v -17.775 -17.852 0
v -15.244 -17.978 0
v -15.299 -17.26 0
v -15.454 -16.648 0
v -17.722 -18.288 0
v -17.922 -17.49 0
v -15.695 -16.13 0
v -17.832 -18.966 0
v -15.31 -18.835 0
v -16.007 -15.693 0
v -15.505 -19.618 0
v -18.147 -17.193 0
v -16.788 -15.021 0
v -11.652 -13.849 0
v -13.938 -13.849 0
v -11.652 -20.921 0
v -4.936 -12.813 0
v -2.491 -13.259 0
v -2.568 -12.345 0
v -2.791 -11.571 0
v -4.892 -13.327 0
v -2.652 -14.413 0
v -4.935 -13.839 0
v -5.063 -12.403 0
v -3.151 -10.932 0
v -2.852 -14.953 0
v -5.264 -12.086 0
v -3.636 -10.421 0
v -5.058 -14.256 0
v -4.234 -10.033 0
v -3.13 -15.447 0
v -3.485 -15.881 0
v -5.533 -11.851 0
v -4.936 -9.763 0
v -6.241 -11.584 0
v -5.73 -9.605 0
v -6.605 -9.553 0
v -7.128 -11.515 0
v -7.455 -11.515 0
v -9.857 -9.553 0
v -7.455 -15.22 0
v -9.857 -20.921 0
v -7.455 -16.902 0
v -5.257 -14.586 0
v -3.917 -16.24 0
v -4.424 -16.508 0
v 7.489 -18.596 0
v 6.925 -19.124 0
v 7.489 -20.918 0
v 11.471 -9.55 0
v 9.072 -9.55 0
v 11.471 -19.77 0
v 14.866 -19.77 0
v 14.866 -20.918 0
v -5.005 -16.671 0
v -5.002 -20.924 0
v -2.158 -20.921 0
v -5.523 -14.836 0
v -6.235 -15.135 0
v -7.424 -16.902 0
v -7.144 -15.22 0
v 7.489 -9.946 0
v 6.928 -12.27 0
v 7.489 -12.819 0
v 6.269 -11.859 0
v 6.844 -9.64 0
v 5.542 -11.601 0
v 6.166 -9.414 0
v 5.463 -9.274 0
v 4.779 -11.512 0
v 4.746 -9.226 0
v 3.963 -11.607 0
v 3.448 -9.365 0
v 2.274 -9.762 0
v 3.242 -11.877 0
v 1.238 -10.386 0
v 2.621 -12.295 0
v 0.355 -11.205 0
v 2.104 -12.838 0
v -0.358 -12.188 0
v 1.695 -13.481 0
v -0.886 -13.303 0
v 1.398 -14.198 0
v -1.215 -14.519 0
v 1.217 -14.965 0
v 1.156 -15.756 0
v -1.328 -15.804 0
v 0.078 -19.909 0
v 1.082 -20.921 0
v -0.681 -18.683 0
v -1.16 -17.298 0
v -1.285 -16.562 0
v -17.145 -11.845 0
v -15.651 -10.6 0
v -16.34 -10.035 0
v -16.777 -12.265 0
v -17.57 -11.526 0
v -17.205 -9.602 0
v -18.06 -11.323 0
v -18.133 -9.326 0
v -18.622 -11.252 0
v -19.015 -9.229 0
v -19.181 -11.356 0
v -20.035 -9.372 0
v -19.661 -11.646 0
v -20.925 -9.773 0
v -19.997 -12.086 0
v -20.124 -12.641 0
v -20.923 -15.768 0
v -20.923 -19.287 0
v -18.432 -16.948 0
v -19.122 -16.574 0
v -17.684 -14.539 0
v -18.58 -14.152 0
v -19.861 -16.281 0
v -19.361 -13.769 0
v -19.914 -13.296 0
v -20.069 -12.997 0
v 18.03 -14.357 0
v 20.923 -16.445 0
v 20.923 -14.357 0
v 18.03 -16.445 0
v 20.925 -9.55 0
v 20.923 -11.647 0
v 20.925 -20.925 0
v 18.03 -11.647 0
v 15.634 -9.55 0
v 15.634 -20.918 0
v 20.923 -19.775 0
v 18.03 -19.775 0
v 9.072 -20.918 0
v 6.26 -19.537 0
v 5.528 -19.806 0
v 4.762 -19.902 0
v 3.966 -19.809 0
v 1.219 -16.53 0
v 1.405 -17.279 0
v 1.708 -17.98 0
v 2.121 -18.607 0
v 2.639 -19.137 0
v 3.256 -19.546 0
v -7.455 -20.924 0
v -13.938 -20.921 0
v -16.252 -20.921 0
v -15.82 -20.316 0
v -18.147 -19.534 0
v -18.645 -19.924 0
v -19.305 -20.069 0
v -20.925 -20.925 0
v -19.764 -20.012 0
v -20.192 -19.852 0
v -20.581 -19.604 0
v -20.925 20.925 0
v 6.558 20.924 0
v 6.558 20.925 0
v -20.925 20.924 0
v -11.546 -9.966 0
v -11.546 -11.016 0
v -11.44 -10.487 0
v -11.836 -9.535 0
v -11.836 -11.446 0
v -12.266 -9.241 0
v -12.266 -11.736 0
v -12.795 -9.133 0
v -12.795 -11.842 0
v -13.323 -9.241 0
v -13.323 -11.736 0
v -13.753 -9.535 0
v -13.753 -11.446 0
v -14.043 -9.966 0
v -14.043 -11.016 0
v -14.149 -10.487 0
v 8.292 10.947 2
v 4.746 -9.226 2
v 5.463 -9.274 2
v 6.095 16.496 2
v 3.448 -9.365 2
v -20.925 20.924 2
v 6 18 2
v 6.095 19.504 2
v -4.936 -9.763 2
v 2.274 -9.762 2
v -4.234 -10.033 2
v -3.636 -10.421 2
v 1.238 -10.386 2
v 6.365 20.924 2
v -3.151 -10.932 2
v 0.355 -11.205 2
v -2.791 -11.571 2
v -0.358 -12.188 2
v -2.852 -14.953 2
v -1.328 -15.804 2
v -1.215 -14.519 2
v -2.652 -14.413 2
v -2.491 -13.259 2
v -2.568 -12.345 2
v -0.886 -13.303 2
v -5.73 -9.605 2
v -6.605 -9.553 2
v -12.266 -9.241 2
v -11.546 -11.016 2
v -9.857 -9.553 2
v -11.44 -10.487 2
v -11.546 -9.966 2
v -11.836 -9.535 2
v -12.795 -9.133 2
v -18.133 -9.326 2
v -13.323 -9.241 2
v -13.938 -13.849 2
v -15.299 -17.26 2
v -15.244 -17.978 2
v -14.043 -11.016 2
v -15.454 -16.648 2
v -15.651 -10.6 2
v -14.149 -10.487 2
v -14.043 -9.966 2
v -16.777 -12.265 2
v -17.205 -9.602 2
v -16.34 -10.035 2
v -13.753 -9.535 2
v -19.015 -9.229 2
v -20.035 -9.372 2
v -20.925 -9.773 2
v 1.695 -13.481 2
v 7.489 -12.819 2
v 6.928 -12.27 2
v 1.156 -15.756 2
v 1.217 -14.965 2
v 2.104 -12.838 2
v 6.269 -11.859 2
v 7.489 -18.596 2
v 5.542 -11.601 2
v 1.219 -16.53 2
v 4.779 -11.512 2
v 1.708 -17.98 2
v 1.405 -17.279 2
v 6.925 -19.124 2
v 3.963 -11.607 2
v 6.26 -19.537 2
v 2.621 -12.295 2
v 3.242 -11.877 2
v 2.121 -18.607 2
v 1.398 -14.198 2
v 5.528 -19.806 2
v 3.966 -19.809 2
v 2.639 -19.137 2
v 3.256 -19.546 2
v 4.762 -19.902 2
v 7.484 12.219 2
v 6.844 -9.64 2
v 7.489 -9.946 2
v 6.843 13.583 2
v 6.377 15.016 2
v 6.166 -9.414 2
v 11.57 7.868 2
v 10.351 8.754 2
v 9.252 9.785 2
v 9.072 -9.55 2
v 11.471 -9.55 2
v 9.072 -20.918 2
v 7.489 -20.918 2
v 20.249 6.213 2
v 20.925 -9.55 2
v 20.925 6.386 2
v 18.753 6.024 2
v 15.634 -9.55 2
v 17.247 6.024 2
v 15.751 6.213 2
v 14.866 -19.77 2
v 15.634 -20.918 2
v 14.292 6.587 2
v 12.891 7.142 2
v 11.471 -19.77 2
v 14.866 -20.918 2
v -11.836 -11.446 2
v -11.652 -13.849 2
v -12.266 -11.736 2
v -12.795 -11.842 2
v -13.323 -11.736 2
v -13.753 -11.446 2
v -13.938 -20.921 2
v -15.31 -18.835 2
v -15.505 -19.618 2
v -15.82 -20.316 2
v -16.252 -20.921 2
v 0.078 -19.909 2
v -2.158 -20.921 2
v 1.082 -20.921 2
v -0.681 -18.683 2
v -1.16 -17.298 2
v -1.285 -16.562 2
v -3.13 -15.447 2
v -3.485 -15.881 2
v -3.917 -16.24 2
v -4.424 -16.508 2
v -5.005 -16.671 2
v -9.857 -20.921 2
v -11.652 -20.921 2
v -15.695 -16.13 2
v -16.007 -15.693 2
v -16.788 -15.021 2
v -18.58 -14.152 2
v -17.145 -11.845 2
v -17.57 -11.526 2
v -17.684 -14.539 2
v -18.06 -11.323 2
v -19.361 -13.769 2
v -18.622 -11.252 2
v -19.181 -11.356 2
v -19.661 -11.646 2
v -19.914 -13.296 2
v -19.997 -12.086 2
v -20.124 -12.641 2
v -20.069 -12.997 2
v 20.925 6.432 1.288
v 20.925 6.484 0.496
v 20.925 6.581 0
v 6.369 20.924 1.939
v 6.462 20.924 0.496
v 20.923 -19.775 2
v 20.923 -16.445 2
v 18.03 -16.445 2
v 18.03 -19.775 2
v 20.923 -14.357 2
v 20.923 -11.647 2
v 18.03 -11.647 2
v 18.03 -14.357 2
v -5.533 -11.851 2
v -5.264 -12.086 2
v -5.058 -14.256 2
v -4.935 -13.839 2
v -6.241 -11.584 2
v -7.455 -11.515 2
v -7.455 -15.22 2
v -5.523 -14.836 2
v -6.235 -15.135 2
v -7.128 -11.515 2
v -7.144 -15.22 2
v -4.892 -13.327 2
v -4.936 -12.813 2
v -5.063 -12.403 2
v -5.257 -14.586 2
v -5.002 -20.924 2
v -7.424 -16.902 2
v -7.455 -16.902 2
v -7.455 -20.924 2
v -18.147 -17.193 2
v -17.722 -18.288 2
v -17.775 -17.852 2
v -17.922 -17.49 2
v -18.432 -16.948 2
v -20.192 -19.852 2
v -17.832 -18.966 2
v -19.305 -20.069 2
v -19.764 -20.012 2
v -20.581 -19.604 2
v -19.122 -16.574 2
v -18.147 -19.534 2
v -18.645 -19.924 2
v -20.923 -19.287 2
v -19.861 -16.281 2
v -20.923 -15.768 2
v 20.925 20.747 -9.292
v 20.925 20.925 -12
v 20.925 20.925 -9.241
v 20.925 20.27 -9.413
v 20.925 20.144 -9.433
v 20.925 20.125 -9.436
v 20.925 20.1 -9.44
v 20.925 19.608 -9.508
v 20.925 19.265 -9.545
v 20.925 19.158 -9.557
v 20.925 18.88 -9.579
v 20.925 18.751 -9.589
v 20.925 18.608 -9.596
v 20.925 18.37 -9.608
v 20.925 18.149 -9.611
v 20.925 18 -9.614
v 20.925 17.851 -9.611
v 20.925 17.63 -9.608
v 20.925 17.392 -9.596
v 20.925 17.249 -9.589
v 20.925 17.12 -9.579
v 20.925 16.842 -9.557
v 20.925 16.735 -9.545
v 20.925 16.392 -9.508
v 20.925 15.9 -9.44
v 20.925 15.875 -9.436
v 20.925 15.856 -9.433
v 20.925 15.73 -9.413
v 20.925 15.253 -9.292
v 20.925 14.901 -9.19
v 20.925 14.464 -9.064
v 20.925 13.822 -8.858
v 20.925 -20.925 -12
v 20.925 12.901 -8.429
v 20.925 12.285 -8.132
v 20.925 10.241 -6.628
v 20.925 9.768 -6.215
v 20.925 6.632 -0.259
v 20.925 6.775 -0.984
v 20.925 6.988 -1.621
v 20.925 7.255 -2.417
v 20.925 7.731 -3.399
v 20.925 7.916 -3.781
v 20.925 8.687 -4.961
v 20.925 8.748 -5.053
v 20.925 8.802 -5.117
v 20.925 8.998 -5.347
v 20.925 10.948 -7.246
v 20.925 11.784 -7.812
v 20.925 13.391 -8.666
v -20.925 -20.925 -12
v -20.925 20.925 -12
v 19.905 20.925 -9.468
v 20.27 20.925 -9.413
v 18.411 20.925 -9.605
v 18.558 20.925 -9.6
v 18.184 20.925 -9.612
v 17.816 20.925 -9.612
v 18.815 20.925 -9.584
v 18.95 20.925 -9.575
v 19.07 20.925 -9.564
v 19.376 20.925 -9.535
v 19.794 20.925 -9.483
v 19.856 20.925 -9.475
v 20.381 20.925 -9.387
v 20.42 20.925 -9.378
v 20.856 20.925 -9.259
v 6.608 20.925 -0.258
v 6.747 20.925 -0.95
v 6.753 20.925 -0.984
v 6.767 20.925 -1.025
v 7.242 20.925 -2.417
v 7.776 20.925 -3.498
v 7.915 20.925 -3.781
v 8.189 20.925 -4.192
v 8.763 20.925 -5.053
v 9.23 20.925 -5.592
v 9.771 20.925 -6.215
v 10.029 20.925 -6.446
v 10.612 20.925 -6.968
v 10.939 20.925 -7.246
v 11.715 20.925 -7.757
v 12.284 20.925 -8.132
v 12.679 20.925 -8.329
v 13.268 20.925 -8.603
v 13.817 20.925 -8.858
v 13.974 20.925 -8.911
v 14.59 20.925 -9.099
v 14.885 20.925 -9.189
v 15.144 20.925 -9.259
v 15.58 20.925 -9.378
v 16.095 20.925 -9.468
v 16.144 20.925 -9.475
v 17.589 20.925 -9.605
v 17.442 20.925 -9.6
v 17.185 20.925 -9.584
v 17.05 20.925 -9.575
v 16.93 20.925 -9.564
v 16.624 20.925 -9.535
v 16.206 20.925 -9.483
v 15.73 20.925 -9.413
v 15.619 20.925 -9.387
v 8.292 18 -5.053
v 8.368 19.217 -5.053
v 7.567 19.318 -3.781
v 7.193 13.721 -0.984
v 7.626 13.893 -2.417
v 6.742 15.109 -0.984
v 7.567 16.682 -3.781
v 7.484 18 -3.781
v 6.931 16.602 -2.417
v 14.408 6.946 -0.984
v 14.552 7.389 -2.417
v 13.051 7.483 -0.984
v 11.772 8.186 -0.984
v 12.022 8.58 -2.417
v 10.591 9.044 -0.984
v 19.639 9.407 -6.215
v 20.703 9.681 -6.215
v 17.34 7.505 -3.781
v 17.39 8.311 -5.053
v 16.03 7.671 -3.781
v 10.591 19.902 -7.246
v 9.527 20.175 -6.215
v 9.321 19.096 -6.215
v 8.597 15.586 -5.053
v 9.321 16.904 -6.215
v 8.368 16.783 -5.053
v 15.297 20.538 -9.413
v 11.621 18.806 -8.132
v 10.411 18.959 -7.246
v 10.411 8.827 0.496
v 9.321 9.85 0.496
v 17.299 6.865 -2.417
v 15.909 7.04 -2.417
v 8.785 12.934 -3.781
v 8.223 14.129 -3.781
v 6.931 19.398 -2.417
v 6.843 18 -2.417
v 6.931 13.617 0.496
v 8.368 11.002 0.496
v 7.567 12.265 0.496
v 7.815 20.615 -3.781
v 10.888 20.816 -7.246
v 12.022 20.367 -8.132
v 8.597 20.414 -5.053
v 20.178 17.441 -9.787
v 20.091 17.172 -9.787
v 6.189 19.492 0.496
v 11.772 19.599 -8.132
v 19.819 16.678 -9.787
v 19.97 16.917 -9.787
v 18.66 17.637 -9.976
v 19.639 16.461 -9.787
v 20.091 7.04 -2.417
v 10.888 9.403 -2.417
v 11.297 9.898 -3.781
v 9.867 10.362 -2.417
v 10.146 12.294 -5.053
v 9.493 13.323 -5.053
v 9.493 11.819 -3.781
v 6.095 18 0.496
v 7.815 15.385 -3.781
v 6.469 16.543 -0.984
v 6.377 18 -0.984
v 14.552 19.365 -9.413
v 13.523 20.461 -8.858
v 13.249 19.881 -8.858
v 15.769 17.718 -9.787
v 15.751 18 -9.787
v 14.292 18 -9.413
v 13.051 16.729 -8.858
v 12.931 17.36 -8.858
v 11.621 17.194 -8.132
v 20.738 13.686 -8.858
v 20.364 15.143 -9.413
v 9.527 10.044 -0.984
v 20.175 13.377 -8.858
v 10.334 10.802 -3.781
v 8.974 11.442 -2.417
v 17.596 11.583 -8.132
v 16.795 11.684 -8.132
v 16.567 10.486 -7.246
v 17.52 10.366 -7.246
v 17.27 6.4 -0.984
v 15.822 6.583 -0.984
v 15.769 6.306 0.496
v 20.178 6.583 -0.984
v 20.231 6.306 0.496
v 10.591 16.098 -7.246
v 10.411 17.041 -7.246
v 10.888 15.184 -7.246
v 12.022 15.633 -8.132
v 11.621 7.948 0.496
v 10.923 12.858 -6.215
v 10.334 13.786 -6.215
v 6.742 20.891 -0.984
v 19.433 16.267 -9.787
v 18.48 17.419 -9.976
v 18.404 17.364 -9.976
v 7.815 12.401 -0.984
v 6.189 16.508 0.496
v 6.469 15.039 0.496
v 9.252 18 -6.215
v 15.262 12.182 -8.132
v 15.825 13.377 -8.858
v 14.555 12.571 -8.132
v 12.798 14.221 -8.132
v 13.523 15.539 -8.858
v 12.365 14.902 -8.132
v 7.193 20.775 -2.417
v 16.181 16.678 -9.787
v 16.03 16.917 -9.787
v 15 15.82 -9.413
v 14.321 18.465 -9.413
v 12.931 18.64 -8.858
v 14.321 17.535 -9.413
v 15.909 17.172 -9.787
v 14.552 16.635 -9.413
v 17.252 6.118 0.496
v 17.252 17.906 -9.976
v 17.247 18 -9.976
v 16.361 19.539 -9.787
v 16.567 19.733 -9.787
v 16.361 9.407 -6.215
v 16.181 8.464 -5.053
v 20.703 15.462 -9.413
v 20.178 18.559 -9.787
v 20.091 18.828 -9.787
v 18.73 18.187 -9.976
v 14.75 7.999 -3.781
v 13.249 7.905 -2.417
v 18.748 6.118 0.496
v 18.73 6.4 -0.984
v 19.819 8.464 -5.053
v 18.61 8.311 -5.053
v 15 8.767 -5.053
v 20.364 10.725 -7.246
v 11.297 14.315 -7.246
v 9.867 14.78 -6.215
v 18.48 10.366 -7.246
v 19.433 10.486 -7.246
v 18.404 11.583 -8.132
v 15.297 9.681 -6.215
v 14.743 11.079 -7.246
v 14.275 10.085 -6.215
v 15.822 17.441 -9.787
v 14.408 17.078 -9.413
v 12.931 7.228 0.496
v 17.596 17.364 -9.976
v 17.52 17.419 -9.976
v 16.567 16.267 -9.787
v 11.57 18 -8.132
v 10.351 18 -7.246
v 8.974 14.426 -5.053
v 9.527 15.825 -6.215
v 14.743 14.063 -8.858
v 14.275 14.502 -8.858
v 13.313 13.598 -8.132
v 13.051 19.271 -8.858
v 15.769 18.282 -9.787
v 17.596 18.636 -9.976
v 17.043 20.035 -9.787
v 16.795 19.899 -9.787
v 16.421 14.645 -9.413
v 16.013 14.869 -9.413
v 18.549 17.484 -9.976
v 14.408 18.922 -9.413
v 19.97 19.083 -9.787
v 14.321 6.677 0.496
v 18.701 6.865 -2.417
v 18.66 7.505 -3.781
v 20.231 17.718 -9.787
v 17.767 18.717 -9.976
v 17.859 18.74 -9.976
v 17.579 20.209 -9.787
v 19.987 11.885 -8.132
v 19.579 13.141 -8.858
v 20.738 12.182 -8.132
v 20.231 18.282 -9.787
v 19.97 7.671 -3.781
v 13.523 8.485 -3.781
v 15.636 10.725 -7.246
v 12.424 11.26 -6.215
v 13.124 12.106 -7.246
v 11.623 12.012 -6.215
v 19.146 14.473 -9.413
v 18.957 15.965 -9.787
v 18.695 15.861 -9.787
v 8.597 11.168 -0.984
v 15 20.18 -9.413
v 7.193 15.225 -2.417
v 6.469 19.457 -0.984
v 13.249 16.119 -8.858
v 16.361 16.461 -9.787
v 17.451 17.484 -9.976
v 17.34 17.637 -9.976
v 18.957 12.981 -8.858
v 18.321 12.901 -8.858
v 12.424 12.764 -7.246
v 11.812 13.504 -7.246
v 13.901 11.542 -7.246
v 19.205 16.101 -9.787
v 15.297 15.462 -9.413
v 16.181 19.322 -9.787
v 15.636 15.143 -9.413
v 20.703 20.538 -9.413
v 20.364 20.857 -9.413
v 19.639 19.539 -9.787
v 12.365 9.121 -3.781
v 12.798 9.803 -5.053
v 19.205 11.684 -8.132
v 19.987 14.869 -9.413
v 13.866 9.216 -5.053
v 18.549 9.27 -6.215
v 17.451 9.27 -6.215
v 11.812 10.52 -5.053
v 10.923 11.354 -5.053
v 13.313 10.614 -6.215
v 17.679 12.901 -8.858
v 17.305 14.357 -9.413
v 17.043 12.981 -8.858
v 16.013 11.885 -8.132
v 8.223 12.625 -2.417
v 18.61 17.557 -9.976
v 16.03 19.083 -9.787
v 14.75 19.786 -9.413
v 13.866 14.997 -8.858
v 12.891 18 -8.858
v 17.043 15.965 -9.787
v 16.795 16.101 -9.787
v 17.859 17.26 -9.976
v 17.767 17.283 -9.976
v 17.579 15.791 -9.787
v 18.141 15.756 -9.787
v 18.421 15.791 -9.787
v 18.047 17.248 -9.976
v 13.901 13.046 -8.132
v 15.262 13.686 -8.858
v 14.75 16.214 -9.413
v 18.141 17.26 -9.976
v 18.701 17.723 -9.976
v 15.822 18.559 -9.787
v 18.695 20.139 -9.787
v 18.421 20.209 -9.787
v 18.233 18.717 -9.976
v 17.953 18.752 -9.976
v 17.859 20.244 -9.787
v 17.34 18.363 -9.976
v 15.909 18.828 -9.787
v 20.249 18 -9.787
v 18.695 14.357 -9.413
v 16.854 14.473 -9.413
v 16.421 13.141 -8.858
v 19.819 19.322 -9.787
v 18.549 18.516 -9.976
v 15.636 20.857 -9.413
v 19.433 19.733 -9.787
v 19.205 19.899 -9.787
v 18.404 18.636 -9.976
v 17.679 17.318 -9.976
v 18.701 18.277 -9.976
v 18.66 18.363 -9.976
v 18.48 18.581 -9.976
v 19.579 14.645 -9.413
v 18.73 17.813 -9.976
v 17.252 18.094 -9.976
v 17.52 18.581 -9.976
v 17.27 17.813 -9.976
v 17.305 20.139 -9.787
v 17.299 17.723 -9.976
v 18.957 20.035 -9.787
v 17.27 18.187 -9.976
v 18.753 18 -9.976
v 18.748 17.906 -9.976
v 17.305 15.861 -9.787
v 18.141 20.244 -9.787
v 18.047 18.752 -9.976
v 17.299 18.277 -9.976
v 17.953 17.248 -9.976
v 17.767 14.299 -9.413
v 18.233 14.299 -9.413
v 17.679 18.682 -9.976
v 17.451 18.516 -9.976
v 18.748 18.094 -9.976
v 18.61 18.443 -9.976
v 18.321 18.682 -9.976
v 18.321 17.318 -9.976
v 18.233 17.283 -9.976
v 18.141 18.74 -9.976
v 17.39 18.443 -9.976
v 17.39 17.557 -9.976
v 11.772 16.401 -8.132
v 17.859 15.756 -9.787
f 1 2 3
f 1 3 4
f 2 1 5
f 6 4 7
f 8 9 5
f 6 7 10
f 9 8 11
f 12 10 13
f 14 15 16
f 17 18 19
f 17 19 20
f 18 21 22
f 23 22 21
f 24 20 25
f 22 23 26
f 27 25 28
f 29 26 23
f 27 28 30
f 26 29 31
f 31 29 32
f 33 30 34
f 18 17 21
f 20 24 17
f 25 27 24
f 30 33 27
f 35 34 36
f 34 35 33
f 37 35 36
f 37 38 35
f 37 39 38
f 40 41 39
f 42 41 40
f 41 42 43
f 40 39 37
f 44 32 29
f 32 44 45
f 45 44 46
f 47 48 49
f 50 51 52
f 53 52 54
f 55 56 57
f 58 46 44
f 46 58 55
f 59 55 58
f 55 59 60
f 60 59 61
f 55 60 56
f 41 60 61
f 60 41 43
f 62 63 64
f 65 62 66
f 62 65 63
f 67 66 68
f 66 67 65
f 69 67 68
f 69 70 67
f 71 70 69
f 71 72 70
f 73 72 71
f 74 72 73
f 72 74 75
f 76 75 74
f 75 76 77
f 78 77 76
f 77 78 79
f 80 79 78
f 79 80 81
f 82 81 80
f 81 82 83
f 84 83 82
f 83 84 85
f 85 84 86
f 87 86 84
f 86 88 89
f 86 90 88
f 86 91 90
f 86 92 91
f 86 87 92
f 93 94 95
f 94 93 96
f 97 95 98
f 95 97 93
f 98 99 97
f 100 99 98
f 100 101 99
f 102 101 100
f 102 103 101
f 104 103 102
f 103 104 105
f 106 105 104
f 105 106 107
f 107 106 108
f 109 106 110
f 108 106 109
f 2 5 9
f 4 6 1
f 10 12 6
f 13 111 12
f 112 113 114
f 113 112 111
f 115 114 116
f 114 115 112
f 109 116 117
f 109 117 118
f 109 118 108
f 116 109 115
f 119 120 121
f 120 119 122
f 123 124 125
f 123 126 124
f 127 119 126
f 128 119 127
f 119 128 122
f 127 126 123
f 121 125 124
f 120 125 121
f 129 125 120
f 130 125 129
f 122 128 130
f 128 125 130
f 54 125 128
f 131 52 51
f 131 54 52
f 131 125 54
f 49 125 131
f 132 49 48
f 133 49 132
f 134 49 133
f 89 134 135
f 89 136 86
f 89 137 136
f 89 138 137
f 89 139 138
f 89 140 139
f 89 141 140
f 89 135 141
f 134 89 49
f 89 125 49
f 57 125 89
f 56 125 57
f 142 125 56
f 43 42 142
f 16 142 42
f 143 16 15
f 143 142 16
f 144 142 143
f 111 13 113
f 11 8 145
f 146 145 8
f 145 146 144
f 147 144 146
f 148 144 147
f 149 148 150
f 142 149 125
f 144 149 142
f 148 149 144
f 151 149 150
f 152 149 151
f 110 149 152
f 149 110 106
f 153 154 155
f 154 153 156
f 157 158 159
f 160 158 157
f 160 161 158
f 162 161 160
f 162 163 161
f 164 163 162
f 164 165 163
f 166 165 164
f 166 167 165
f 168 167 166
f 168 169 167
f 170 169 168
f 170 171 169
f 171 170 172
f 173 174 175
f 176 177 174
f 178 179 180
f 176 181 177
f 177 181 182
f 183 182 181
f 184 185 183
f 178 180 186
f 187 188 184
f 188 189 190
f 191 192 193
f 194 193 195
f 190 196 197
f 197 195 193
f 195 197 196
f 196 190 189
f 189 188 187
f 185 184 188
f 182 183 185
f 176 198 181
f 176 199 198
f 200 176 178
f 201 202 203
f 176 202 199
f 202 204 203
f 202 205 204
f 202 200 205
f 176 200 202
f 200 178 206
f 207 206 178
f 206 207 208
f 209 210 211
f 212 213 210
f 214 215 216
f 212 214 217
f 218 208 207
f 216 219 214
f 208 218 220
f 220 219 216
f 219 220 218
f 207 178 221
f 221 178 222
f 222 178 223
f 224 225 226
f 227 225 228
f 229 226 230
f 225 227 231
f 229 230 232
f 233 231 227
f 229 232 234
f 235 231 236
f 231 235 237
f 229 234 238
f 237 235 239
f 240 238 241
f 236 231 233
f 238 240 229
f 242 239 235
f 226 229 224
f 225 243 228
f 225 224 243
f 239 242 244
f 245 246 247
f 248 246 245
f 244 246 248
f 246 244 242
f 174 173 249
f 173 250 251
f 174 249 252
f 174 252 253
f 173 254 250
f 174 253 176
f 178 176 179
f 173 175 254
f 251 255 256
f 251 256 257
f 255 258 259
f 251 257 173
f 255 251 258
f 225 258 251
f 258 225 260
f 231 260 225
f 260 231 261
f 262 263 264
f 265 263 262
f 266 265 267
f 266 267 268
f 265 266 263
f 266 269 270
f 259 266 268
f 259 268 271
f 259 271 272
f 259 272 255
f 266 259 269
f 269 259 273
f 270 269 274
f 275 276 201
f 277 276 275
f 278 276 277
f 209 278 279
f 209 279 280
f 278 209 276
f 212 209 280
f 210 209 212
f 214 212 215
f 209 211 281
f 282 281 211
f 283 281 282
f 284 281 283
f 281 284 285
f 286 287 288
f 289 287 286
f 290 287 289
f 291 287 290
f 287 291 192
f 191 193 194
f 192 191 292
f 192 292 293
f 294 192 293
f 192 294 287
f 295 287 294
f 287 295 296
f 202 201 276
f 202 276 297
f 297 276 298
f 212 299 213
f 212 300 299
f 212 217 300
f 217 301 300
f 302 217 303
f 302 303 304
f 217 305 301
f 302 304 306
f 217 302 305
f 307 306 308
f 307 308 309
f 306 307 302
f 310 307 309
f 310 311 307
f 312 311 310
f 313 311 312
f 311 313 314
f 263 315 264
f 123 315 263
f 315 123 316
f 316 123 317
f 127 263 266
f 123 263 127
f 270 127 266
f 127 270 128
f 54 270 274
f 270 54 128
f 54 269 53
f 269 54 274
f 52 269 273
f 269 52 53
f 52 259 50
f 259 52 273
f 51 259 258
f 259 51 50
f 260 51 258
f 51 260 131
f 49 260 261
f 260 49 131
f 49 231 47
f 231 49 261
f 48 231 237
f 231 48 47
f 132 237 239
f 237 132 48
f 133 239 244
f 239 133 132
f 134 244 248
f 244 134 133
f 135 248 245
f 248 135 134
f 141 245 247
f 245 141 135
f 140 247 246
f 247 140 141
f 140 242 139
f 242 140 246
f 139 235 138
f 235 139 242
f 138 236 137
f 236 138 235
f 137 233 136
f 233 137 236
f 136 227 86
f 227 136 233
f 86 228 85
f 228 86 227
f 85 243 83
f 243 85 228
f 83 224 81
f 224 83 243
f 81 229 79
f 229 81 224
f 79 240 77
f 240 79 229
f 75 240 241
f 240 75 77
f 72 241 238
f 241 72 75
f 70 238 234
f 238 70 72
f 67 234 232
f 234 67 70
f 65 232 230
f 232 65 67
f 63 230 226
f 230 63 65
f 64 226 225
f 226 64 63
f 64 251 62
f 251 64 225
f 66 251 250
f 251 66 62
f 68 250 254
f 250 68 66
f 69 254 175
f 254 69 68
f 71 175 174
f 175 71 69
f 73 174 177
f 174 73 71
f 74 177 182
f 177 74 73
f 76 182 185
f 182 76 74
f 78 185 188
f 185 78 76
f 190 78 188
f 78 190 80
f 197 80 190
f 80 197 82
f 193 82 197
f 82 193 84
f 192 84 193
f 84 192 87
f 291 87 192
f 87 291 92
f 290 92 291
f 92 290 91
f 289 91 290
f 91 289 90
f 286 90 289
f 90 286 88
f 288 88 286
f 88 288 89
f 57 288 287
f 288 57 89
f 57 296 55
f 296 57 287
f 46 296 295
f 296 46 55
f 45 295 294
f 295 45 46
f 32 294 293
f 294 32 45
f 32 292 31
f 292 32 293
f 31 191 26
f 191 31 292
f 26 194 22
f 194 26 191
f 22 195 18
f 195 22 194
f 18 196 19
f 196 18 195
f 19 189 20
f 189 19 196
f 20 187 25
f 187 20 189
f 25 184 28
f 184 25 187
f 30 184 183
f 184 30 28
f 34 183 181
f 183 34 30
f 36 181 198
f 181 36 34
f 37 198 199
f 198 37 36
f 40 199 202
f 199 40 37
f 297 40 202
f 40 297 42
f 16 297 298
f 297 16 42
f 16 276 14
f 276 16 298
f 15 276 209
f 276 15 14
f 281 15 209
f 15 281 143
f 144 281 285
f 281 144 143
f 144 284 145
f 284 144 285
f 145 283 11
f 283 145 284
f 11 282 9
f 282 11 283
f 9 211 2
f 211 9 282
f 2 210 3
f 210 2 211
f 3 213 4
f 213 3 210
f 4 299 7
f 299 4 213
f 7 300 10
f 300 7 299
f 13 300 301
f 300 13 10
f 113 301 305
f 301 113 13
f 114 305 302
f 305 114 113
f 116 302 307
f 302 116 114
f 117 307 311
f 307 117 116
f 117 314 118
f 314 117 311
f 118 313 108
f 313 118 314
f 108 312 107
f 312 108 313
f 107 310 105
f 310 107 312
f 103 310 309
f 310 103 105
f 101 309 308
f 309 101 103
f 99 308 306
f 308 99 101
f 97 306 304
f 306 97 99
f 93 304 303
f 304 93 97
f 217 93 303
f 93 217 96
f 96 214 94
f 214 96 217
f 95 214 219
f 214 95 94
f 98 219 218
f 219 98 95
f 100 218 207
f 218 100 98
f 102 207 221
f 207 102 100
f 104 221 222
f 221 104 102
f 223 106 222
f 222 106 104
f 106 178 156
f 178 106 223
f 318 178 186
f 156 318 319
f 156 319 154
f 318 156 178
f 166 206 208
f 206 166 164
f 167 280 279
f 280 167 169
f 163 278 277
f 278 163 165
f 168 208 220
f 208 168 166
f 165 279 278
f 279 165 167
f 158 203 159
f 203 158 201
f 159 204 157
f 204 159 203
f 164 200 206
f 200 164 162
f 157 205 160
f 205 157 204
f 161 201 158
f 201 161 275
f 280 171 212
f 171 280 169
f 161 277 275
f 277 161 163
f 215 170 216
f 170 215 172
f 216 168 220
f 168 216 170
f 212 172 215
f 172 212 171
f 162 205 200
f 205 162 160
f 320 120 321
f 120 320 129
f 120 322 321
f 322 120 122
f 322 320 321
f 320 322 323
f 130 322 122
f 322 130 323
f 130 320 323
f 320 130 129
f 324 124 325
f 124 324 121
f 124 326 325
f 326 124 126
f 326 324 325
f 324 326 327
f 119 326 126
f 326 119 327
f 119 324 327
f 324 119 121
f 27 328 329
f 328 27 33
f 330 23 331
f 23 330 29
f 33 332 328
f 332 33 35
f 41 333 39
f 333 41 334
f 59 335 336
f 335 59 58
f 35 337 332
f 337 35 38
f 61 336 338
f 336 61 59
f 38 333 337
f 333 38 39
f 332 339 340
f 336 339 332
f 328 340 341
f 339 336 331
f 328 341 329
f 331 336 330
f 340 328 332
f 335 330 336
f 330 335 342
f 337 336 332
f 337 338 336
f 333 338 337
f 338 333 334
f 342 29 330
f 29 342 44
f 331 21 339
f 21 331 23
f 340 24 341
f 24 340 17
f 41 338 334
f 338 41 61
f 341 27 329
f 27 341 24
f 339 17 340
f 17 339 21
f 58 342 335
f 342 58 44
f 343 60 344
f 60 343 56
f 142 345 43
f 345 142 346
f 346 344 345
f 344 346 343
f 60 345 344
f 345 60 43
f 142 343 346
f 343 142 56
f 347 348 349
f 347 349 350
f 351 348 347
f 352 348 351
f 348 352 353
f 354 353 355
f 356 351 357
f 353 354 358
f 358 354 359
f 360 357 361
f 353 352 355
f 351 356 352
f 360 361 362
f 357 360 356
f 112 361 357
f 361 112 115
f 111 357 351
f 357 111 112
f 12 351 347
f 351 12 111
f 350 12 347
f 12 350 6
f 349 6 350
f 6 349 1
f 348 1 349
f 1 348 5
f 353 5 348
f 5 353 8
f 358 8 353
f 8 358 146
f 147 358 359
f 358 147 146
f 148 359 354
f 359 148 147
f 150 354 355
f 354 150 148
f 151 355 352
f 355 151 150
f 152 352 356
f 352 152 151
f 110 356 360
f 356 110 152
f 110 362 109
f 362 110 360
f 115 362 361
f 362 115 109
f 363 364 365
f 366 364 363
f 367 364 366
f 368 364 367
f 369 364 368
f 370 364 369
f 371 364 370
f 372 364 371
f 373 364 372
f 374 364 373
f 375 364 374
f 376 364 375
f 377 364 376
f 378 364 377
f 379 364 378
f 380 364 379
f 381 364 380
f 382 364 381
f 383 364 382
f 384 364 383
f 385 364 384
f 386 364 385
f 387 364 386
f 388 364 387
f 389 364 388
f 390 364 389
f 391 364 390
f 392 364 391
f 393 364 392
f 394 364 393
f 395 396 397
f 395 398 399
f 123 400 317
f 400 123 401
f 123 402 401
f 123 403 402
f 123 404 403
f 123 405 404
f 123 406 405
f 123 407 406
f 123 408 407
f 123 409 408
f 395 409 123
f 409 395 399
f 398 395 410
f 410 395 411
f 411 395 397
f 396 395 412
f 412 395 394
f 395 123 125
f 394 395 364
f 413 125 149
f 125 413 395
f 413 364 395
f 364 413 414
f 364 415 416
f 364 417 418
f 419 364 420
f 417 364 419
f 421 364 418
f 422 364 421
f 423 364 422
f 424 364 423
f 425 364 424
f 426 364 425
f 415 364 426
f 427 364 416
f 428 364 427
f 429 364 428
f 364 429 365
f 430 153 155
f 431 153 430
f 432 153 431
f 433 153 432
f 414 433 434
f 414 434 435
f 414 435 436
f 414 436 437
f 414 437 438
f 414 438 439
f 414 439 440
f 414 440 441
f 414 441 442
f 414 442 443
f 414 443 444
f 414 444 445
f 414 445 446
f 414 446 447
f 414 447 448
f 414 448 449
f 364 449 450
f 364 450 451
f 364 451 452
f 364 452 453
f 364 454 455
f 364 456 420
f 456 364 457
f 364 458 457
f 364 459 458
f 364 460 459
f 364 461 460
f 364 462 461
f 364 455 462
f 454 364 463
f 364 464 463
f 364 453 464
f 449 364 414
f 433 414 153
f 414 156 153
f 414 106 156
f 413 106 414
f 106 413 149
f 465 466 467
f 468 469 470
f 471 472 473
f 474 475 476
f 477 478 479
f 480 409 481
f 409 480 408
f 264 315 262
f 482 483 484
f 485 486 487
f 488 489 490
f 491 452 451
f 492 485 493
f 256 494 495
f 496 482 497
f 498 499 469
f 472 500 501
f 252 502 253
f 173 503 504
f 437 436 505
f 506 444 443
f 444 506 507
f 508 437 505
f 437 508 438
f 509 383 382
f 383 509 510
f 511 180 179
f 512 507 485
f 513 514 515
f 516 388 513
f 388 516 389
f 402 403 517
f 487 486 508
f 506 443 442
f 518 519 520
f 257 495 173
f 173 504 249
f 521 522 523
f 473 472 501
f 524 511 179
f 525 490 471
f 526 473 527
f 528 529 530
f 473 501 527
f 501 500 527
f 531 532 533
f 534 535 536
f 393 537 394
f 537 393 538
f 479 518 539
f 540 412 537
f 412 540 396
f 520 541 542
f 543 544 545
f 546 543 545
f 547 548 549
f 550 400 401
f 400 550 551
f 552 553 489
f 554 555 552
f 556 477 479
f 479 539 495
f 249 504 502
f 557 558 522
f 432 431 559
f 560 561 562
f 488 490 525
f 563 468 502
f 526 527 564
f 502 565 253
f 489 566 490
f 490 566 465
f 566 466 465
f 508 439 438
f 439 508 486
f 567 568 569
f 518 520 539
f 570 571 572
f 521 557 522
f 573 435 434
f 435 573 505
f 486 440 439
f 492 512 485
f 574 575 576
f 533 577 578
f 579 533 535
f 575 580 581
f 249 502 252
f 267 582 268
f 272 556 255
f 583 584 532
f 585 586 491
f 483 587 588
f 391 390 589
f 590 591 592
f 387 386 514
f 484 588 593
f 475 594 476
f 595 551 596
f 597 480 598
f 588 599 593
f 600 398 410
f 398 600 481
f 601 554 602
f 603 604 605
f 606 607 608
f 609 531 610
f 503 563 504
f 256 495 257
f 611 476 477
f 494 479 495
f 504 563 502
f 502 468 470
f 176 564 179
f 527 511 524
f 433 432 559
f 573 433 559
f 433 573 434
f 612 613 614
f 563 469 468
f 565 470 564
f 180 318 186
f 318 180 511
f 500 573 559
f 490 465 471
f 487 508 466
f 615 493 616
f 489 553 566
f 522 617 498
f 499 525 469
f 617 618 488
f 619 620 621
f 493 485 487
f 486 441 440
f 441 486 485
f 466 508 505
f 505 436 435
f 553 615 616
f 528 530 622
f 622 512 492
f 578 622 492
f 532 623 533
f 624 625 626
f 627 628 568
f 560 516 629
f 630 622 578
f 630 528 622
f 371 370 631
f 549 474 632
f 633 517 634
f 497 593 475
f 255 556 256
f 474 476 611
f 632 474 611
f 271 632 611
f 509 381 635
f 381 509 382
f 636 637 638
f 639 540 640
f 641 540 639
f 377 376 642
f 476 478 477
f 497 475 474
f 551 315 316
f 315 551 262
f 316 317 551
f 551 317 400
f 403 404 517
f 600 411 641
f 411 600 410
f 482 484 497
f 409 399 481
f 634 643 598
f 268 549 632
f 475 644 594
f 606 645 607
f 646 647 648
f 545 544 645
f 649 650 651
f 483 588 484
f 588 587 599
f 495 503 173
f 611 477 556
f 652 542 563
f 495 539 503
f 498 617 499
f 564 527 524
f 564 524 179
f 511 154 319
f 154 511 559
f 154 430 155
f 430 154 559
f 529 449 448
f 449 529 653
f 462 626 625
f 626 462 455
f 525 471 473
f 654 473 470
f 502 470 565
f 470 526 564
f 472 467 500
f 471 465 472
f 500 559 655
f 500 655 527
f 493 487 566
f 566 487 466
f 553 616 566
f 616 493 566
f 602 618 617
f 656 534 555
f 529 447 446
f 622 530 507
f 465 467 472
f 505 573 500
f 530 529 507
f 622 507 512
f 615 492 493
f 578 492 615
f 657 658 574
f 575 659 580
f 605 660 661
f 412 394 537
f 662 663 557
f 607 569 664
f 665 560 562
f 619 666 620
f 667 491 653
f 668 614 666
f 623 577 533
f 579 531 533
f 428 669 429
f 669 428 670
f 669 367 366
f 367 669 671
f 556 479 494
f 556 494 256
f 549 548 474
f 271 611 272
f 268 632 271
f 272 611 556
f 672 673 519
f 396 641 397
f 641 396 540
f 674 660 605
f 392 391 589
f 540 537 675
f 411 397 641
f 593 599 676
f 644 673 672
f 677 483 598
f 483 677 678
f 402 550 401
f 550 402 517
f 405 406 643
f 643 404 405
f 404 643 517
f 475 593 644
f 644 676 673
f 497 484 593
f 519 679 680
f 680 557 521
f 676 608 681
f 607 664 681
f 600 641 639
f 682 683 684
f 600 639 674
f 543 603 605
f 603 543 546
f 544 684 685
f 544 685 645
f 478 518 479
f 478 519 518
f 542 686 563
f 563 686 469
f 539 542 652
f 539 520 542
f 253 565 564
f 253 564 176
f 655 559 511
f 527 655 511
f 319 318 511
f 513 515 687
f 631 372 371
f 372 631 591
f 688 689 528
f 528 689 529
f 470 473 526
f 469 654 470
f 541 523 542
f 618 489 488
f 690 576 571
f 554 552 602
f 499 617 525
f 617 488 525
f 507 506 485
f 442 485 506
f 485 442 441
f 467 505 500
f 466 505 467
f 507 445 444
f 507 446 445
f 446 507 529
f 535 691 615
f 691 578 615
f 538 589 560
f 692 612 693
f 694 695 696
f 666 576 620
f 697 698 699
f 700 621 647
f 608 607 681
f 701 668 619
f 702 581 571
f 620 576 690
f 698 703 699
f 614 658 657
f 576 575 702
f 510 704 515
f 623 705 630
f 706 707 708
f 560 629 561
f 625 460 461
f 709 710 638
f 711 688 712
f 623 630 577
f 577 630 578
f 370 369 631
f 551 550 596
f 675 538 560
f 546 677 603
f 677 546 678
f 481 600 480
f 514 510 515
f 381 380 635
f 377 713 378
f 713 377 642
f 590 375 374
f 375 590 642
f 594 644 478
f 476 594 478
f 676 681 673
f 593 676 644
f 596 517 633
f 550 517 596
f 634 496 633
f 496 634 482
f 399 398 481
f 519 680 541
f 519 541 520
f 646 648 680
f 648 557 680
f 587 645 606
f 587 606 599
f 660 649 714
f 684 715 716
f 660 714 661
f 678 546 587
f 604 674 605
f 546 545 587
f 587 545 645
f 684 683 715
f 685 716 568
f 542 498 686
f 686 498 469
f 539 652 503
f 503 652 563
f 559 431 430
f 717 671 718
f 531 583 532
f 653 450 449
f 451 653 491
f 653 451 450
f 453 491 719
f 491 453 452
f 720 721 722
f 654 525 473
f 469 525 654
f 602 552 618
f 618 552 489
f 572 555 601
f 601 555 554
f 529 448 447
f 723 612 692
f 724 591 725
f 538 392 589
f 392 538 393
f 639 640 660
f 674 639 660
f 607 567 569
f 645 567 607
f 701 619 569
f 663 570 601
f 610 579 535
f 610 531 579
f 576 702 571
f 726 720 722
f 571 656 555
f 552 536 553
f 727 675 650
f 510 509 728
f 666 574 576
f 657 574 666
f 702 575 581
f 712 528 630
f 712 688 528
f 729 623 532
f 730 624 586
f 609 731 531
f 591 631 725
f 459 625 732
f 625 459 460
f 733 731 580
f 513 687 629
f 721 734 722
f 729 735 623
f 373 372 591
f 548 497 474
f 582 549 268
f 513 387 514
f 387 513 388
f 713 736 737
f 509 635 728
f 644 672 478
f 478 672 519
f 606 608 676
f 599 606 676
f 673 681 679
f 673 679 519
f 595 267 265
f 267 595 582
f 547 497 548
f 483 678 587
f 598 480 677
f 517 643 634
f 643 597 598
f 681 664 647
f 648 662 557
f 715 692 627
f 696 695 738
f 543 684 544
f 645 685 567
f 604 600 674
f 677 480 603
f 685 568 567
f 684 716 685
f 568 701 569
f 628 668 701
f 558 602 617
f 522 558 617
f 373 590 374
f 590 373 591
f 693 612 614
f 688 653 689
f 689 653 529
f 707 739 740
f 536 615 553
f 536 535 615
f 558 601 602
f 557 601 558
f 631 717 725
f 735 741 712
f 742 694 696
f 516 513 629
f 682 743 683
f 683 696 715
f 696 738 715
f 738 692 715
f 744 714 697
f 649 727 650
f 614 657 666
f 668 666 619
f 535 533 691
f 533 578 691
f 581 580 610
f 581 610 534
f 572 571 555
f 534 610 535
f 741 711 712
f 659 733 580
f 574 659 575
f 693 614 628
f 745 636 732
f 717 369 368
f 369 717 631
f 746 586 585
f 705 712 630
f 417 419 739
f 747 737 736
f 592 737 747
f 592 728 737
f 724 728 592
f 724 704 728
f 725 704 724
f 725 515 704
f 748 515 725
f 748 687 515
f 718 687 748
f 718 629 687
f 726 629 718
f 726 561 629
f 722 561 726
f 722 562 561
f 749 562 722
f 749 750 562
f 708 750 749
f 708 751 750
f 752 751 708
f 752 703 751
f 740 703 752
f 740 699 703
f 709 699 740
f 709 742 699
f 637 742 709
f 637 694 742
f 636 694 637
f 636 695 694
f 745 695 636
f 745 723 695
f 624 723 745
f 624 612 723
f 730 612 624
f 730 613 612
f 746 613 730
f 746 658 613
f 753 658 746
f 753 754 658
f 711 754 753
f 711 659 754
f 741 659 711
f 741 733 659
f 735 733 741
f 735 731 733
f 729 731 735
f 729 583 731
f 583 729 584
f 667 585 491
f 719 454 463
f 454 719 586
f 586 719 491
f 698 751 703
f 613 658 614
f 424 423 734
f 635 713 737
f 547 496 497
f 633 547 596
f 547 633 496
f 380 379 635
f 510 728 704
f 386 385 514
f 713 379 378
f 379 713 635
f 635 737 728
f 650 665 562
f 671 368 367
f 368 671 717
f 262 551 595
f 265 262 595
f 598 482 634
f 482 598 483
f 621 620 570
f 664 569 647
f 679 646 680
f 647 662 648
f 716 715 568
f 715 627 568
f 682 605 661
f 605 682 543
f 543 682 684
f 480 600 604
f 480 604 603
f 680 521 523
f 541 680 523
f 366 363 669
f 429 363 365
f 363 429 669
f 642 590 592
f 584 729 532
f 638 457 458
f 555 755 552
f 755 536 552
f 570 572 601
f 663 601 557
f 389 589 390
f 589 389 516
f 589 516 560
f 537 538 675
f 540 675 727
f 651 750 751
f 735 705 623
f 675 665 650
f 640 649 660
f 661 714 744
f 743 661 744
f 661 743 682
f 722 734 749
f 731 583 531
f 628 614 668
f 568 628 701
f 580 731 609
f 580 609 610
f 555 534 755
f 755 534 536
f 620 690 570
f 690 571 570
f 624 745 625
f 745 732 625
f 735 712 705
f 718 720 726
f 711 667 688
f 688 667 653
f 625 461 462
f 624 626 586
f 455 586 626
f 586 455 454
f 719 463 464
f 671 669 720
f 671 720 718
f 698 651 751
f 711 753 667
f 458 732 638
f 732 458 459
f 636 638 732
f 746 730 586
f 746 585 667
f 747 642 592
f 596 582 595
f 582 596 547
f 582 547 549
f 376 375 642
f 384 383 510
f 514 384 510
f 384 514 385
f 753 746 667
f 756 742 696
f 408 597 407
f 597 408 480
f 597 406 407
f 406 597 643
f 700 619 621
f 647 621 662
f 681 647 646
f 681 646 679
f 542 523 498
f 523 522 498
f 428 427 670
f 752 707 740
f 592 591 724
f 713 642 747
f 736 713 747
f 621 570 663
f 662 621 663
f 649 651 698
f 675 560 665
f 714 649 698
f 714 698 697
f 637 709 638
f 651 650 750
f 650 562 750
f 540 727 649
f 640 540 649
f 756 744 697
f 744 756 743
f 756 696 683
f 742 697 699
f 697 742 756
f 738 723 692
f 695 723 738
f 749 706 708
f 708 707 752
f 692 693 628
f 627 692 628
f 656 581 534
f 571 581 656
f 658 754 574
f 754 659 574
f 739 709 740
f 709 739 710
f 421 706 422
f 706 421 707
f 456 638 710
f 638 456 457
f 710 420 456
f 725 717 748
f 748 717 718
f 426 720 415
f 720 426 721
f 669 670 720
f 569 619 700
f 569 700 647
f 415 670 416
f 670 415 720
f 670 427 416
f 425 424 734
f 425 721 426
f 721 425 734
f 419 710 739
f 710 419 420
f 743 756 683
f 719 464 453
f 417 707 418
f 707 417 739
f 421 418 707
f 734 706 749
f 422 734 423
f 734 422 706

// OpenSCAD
// Module names are of the form poly_<inkscape-path-id>().  As a result,
// you can associate a polygon in this OpenSCAD program with the corresponding
// SVG element in the Inkscape document by looking for the XML element with
// the attribute id="inkscape-path-id".

// fudge value is used to ensure that subtracted solids are a tad taller
// in the z dimension than the polygon being subtracted from.  This helps
// keep the resulting .stl file manifold.
fudge = 0.1;

c=41.85;
tr=18;
h=2;

difference(){
  union() {
    mirror([0,0,-1])linear_extrude(height=12){
      square(c,c,center=true);
    }
    poly_path3044(h);
  }
translate([tr,tr,h]) sphere(r=12,$fn=50);
  
}


module poly_path3044(h)
{
  scale([25.4/90, -25.4/90, 1]) union()
  {
    linear_extrude(height=h)
      polygon([[63.885000,70.070000],[74.135000,70.070000],[74.135000,58.270000],[63.885000,58.270000],[63.885000,70.070000]]);
    linear_extrude(height=h)
      polygon([[63.885000,50.870000],[74.135000,50.870000],[74.135000,41.270000],[63.885000,41.270000],[63.885000,50.870000]]);
    difference()
    {
       linear_extrude(height=h)
         polygon([[27.525000,-73.490000],[27.535000,-74.140000],[-74.145000,-74.140000],[-74.145000,34.630000],[-70.988750,33.207500],[-67.375000,32.700000],[-64.251094,33.044531],[-60.961250,34.023750],[-57.898281,35.556094],[-55.455000,37.560000],[-59.445000,43.460000],[-60.750937,41.970937],[-62.257500,40.840000],[-63.992812,40.121562],[-65.985000,39.870000],[-67.963750,40.239375],[-69.665000,41.265000],[-70.856250,42.823125],[-71.305000,44.790000],[-71.110825,46.052881],[-70.562070,47.112734],[-68.603437,48.788125],[-65.834336,50.145703],[-62.660000,51.515000],[-59.485664,53.225547],[-56.716562,55.606875],[-55.610610,57.152061],[-54.757930,58.988516],[-54.209175,61.157432],[-54.015000,63.700000],[-54.249375,66.737344],[-54.937500,69.511250],[-56.056875,71.987031],[-57.585000,74.130000],[-49.385000,74.130000],[-49.385000,49.070000],[-41.285000,49.070000],[-41.285000,74.130000],[-34.925000,74.130000],[-34.925000,33.850000],[-23.405000,33.850000],[-20.303633,34.032324],[-17.490313,34.592344],[-15.003711,35.549629],[-12.882500,36.923750],[-11.165352,38.734277],[-9.890938,41.000781],[-9.097930,43.742832],[-8.825000,46.980000],[-9.395937,51.071250],[-10.104336,52.983281],[-11.090000,54.735000],[-12.349414,56.272969],[-13.879062,57.543750],[-15.675430,58.493906],[-17.735000,59.070000],[-7.645000,74.130000],[3.835000,74.130000],[0.277344,70.542031],[-2.411250,66.201250],[-4.111719,61.292344],[-4.554199,58.682559],[-4.705000,56.000000],[-4.304902,51.443984],[-3.141094,47.135000],[-1.268301,43.184141],[1.258750,39.702500],[4.385332,36.801172],[8.056719,34.591250],[12.218184,33.183828],[16.815000,32.690000],[19.357500,32.860625],[21.847500,33.357500],[24.251250,34.158125],[26.535000,35.240000],[26.535000,45.420000],[24.547031,43.477344],[22.211250,42.021250],[19.637344,41.107031],[16.935000,40.790000],[14.040469,41.127813],[11.486250,42.082500],[9.286406,43.565938],[7.455000,45.490000],[6.006094,47.766562],[4.953750,50.307500],[4.312031,53.024688],[4.095000,55.830000],[4.319297,58.571465],[4.978125,61.226094],[6.050391,63.707988],[7.515000,65.931250],[9.350859,67.809980],[11.536875,69.258281],[14.051953,70.190254],[16.875000,70.520000],[19.586719,70.179063],[22.181250,69.225000],[24.537656,67.760938],[26.535000,65.890000],[26.535000,74.120000],[32.145000,74.120000],[32.145000,33.840000],[40.645000,33.840000],[40.645000,70.050000],[52.675000,70.050000],[52.675000,74.120000],[55.395000,74.120000],[55.395000,33.840000],[74.145000,33.840000],[74.145000,-26.080000],[69.363135,-26.398423],[64.722891,-27.177070],[60.247295,-28.392886],[55.959375,-30.022813],[51.882158,-32.043794],[48.038672,-34.432773],[44.451943,-37.166694],[41.145000,-40.222500],[38.140869,-43.577134],[35.462578,-47.207539],[33.133154,-51.090659],[31.175625,-55.203438],[29.613018,-59.522817],[28.468359,-64.025742],[27.764678,-68.689155],[27.525000,-73.490000]]);
       translate([0, 0, -fudge])
         linear_extrude(height=h+2*fudge)
           polygon([[-45.335000,41.960000],[-47.207188,41.584063],[-48.732500,40.557500],[-49.759062,39.032187],[-50.135000,37.160000],[-49.759062,35.313125],[-48.732500,33.785000],[-47.207188,32.744375],[-45.335000,32.360000],[-43.462812,32.744375],[-41.937500,33.785000],[-40.910938,35.313125],[-40.535000,37.160000],[-40.910937,39.032187],[-41.937500,40.557500],[-43.462812,41.584063],[-45.335000,41.960000]]);
    }
    linear_extrude(height=h)
      polygon([[-17.335000,47.220000],[-17.490332,45.399492],[-17.938281,43.947187],[-18.651777,42.824414],[-19.603750,41.992500],[-22.114844,41.046562],[-25.255000,40.800000],[-26.415000,40.800000],[-26.415000,53.930000],[-25.315000,53.930000],[-22.093750,53.629688],[-19.570000,52.570000],[-18.625937,51.680977],[-17.923750,50.512812],[-17.485937,49.035742],[-17.335000,47.220000]]);
    linear_extrude(height=h)
      polygon([[-26.415000,59.890000],[-26.415000,74.140000],[-17.725000,74.140000],[-26.305000,59.890000],[-26.415000,59.890000]]);
    linear_extrude(height=h)
      polygon([[-70.375000,57.690000],[-74.135000,55.870000],[-74.135000,68.340000],[-72.924688,69.464687],[-71.547500,70.340000],[-70.031562,70.907813],[-68.405000,71.110000],[-66.064531,70.596562],[-64.298750,69.215000],[-63.183594,67.203438],[-62.795000,64.800000],[-62.983711,63.254180],[-63.504062,61.973438],[-64.298633,60.919102],[-65.310000,60.052500],[-67.753438,58.727812],[-70.375000,57.690000]]);
  }
}
